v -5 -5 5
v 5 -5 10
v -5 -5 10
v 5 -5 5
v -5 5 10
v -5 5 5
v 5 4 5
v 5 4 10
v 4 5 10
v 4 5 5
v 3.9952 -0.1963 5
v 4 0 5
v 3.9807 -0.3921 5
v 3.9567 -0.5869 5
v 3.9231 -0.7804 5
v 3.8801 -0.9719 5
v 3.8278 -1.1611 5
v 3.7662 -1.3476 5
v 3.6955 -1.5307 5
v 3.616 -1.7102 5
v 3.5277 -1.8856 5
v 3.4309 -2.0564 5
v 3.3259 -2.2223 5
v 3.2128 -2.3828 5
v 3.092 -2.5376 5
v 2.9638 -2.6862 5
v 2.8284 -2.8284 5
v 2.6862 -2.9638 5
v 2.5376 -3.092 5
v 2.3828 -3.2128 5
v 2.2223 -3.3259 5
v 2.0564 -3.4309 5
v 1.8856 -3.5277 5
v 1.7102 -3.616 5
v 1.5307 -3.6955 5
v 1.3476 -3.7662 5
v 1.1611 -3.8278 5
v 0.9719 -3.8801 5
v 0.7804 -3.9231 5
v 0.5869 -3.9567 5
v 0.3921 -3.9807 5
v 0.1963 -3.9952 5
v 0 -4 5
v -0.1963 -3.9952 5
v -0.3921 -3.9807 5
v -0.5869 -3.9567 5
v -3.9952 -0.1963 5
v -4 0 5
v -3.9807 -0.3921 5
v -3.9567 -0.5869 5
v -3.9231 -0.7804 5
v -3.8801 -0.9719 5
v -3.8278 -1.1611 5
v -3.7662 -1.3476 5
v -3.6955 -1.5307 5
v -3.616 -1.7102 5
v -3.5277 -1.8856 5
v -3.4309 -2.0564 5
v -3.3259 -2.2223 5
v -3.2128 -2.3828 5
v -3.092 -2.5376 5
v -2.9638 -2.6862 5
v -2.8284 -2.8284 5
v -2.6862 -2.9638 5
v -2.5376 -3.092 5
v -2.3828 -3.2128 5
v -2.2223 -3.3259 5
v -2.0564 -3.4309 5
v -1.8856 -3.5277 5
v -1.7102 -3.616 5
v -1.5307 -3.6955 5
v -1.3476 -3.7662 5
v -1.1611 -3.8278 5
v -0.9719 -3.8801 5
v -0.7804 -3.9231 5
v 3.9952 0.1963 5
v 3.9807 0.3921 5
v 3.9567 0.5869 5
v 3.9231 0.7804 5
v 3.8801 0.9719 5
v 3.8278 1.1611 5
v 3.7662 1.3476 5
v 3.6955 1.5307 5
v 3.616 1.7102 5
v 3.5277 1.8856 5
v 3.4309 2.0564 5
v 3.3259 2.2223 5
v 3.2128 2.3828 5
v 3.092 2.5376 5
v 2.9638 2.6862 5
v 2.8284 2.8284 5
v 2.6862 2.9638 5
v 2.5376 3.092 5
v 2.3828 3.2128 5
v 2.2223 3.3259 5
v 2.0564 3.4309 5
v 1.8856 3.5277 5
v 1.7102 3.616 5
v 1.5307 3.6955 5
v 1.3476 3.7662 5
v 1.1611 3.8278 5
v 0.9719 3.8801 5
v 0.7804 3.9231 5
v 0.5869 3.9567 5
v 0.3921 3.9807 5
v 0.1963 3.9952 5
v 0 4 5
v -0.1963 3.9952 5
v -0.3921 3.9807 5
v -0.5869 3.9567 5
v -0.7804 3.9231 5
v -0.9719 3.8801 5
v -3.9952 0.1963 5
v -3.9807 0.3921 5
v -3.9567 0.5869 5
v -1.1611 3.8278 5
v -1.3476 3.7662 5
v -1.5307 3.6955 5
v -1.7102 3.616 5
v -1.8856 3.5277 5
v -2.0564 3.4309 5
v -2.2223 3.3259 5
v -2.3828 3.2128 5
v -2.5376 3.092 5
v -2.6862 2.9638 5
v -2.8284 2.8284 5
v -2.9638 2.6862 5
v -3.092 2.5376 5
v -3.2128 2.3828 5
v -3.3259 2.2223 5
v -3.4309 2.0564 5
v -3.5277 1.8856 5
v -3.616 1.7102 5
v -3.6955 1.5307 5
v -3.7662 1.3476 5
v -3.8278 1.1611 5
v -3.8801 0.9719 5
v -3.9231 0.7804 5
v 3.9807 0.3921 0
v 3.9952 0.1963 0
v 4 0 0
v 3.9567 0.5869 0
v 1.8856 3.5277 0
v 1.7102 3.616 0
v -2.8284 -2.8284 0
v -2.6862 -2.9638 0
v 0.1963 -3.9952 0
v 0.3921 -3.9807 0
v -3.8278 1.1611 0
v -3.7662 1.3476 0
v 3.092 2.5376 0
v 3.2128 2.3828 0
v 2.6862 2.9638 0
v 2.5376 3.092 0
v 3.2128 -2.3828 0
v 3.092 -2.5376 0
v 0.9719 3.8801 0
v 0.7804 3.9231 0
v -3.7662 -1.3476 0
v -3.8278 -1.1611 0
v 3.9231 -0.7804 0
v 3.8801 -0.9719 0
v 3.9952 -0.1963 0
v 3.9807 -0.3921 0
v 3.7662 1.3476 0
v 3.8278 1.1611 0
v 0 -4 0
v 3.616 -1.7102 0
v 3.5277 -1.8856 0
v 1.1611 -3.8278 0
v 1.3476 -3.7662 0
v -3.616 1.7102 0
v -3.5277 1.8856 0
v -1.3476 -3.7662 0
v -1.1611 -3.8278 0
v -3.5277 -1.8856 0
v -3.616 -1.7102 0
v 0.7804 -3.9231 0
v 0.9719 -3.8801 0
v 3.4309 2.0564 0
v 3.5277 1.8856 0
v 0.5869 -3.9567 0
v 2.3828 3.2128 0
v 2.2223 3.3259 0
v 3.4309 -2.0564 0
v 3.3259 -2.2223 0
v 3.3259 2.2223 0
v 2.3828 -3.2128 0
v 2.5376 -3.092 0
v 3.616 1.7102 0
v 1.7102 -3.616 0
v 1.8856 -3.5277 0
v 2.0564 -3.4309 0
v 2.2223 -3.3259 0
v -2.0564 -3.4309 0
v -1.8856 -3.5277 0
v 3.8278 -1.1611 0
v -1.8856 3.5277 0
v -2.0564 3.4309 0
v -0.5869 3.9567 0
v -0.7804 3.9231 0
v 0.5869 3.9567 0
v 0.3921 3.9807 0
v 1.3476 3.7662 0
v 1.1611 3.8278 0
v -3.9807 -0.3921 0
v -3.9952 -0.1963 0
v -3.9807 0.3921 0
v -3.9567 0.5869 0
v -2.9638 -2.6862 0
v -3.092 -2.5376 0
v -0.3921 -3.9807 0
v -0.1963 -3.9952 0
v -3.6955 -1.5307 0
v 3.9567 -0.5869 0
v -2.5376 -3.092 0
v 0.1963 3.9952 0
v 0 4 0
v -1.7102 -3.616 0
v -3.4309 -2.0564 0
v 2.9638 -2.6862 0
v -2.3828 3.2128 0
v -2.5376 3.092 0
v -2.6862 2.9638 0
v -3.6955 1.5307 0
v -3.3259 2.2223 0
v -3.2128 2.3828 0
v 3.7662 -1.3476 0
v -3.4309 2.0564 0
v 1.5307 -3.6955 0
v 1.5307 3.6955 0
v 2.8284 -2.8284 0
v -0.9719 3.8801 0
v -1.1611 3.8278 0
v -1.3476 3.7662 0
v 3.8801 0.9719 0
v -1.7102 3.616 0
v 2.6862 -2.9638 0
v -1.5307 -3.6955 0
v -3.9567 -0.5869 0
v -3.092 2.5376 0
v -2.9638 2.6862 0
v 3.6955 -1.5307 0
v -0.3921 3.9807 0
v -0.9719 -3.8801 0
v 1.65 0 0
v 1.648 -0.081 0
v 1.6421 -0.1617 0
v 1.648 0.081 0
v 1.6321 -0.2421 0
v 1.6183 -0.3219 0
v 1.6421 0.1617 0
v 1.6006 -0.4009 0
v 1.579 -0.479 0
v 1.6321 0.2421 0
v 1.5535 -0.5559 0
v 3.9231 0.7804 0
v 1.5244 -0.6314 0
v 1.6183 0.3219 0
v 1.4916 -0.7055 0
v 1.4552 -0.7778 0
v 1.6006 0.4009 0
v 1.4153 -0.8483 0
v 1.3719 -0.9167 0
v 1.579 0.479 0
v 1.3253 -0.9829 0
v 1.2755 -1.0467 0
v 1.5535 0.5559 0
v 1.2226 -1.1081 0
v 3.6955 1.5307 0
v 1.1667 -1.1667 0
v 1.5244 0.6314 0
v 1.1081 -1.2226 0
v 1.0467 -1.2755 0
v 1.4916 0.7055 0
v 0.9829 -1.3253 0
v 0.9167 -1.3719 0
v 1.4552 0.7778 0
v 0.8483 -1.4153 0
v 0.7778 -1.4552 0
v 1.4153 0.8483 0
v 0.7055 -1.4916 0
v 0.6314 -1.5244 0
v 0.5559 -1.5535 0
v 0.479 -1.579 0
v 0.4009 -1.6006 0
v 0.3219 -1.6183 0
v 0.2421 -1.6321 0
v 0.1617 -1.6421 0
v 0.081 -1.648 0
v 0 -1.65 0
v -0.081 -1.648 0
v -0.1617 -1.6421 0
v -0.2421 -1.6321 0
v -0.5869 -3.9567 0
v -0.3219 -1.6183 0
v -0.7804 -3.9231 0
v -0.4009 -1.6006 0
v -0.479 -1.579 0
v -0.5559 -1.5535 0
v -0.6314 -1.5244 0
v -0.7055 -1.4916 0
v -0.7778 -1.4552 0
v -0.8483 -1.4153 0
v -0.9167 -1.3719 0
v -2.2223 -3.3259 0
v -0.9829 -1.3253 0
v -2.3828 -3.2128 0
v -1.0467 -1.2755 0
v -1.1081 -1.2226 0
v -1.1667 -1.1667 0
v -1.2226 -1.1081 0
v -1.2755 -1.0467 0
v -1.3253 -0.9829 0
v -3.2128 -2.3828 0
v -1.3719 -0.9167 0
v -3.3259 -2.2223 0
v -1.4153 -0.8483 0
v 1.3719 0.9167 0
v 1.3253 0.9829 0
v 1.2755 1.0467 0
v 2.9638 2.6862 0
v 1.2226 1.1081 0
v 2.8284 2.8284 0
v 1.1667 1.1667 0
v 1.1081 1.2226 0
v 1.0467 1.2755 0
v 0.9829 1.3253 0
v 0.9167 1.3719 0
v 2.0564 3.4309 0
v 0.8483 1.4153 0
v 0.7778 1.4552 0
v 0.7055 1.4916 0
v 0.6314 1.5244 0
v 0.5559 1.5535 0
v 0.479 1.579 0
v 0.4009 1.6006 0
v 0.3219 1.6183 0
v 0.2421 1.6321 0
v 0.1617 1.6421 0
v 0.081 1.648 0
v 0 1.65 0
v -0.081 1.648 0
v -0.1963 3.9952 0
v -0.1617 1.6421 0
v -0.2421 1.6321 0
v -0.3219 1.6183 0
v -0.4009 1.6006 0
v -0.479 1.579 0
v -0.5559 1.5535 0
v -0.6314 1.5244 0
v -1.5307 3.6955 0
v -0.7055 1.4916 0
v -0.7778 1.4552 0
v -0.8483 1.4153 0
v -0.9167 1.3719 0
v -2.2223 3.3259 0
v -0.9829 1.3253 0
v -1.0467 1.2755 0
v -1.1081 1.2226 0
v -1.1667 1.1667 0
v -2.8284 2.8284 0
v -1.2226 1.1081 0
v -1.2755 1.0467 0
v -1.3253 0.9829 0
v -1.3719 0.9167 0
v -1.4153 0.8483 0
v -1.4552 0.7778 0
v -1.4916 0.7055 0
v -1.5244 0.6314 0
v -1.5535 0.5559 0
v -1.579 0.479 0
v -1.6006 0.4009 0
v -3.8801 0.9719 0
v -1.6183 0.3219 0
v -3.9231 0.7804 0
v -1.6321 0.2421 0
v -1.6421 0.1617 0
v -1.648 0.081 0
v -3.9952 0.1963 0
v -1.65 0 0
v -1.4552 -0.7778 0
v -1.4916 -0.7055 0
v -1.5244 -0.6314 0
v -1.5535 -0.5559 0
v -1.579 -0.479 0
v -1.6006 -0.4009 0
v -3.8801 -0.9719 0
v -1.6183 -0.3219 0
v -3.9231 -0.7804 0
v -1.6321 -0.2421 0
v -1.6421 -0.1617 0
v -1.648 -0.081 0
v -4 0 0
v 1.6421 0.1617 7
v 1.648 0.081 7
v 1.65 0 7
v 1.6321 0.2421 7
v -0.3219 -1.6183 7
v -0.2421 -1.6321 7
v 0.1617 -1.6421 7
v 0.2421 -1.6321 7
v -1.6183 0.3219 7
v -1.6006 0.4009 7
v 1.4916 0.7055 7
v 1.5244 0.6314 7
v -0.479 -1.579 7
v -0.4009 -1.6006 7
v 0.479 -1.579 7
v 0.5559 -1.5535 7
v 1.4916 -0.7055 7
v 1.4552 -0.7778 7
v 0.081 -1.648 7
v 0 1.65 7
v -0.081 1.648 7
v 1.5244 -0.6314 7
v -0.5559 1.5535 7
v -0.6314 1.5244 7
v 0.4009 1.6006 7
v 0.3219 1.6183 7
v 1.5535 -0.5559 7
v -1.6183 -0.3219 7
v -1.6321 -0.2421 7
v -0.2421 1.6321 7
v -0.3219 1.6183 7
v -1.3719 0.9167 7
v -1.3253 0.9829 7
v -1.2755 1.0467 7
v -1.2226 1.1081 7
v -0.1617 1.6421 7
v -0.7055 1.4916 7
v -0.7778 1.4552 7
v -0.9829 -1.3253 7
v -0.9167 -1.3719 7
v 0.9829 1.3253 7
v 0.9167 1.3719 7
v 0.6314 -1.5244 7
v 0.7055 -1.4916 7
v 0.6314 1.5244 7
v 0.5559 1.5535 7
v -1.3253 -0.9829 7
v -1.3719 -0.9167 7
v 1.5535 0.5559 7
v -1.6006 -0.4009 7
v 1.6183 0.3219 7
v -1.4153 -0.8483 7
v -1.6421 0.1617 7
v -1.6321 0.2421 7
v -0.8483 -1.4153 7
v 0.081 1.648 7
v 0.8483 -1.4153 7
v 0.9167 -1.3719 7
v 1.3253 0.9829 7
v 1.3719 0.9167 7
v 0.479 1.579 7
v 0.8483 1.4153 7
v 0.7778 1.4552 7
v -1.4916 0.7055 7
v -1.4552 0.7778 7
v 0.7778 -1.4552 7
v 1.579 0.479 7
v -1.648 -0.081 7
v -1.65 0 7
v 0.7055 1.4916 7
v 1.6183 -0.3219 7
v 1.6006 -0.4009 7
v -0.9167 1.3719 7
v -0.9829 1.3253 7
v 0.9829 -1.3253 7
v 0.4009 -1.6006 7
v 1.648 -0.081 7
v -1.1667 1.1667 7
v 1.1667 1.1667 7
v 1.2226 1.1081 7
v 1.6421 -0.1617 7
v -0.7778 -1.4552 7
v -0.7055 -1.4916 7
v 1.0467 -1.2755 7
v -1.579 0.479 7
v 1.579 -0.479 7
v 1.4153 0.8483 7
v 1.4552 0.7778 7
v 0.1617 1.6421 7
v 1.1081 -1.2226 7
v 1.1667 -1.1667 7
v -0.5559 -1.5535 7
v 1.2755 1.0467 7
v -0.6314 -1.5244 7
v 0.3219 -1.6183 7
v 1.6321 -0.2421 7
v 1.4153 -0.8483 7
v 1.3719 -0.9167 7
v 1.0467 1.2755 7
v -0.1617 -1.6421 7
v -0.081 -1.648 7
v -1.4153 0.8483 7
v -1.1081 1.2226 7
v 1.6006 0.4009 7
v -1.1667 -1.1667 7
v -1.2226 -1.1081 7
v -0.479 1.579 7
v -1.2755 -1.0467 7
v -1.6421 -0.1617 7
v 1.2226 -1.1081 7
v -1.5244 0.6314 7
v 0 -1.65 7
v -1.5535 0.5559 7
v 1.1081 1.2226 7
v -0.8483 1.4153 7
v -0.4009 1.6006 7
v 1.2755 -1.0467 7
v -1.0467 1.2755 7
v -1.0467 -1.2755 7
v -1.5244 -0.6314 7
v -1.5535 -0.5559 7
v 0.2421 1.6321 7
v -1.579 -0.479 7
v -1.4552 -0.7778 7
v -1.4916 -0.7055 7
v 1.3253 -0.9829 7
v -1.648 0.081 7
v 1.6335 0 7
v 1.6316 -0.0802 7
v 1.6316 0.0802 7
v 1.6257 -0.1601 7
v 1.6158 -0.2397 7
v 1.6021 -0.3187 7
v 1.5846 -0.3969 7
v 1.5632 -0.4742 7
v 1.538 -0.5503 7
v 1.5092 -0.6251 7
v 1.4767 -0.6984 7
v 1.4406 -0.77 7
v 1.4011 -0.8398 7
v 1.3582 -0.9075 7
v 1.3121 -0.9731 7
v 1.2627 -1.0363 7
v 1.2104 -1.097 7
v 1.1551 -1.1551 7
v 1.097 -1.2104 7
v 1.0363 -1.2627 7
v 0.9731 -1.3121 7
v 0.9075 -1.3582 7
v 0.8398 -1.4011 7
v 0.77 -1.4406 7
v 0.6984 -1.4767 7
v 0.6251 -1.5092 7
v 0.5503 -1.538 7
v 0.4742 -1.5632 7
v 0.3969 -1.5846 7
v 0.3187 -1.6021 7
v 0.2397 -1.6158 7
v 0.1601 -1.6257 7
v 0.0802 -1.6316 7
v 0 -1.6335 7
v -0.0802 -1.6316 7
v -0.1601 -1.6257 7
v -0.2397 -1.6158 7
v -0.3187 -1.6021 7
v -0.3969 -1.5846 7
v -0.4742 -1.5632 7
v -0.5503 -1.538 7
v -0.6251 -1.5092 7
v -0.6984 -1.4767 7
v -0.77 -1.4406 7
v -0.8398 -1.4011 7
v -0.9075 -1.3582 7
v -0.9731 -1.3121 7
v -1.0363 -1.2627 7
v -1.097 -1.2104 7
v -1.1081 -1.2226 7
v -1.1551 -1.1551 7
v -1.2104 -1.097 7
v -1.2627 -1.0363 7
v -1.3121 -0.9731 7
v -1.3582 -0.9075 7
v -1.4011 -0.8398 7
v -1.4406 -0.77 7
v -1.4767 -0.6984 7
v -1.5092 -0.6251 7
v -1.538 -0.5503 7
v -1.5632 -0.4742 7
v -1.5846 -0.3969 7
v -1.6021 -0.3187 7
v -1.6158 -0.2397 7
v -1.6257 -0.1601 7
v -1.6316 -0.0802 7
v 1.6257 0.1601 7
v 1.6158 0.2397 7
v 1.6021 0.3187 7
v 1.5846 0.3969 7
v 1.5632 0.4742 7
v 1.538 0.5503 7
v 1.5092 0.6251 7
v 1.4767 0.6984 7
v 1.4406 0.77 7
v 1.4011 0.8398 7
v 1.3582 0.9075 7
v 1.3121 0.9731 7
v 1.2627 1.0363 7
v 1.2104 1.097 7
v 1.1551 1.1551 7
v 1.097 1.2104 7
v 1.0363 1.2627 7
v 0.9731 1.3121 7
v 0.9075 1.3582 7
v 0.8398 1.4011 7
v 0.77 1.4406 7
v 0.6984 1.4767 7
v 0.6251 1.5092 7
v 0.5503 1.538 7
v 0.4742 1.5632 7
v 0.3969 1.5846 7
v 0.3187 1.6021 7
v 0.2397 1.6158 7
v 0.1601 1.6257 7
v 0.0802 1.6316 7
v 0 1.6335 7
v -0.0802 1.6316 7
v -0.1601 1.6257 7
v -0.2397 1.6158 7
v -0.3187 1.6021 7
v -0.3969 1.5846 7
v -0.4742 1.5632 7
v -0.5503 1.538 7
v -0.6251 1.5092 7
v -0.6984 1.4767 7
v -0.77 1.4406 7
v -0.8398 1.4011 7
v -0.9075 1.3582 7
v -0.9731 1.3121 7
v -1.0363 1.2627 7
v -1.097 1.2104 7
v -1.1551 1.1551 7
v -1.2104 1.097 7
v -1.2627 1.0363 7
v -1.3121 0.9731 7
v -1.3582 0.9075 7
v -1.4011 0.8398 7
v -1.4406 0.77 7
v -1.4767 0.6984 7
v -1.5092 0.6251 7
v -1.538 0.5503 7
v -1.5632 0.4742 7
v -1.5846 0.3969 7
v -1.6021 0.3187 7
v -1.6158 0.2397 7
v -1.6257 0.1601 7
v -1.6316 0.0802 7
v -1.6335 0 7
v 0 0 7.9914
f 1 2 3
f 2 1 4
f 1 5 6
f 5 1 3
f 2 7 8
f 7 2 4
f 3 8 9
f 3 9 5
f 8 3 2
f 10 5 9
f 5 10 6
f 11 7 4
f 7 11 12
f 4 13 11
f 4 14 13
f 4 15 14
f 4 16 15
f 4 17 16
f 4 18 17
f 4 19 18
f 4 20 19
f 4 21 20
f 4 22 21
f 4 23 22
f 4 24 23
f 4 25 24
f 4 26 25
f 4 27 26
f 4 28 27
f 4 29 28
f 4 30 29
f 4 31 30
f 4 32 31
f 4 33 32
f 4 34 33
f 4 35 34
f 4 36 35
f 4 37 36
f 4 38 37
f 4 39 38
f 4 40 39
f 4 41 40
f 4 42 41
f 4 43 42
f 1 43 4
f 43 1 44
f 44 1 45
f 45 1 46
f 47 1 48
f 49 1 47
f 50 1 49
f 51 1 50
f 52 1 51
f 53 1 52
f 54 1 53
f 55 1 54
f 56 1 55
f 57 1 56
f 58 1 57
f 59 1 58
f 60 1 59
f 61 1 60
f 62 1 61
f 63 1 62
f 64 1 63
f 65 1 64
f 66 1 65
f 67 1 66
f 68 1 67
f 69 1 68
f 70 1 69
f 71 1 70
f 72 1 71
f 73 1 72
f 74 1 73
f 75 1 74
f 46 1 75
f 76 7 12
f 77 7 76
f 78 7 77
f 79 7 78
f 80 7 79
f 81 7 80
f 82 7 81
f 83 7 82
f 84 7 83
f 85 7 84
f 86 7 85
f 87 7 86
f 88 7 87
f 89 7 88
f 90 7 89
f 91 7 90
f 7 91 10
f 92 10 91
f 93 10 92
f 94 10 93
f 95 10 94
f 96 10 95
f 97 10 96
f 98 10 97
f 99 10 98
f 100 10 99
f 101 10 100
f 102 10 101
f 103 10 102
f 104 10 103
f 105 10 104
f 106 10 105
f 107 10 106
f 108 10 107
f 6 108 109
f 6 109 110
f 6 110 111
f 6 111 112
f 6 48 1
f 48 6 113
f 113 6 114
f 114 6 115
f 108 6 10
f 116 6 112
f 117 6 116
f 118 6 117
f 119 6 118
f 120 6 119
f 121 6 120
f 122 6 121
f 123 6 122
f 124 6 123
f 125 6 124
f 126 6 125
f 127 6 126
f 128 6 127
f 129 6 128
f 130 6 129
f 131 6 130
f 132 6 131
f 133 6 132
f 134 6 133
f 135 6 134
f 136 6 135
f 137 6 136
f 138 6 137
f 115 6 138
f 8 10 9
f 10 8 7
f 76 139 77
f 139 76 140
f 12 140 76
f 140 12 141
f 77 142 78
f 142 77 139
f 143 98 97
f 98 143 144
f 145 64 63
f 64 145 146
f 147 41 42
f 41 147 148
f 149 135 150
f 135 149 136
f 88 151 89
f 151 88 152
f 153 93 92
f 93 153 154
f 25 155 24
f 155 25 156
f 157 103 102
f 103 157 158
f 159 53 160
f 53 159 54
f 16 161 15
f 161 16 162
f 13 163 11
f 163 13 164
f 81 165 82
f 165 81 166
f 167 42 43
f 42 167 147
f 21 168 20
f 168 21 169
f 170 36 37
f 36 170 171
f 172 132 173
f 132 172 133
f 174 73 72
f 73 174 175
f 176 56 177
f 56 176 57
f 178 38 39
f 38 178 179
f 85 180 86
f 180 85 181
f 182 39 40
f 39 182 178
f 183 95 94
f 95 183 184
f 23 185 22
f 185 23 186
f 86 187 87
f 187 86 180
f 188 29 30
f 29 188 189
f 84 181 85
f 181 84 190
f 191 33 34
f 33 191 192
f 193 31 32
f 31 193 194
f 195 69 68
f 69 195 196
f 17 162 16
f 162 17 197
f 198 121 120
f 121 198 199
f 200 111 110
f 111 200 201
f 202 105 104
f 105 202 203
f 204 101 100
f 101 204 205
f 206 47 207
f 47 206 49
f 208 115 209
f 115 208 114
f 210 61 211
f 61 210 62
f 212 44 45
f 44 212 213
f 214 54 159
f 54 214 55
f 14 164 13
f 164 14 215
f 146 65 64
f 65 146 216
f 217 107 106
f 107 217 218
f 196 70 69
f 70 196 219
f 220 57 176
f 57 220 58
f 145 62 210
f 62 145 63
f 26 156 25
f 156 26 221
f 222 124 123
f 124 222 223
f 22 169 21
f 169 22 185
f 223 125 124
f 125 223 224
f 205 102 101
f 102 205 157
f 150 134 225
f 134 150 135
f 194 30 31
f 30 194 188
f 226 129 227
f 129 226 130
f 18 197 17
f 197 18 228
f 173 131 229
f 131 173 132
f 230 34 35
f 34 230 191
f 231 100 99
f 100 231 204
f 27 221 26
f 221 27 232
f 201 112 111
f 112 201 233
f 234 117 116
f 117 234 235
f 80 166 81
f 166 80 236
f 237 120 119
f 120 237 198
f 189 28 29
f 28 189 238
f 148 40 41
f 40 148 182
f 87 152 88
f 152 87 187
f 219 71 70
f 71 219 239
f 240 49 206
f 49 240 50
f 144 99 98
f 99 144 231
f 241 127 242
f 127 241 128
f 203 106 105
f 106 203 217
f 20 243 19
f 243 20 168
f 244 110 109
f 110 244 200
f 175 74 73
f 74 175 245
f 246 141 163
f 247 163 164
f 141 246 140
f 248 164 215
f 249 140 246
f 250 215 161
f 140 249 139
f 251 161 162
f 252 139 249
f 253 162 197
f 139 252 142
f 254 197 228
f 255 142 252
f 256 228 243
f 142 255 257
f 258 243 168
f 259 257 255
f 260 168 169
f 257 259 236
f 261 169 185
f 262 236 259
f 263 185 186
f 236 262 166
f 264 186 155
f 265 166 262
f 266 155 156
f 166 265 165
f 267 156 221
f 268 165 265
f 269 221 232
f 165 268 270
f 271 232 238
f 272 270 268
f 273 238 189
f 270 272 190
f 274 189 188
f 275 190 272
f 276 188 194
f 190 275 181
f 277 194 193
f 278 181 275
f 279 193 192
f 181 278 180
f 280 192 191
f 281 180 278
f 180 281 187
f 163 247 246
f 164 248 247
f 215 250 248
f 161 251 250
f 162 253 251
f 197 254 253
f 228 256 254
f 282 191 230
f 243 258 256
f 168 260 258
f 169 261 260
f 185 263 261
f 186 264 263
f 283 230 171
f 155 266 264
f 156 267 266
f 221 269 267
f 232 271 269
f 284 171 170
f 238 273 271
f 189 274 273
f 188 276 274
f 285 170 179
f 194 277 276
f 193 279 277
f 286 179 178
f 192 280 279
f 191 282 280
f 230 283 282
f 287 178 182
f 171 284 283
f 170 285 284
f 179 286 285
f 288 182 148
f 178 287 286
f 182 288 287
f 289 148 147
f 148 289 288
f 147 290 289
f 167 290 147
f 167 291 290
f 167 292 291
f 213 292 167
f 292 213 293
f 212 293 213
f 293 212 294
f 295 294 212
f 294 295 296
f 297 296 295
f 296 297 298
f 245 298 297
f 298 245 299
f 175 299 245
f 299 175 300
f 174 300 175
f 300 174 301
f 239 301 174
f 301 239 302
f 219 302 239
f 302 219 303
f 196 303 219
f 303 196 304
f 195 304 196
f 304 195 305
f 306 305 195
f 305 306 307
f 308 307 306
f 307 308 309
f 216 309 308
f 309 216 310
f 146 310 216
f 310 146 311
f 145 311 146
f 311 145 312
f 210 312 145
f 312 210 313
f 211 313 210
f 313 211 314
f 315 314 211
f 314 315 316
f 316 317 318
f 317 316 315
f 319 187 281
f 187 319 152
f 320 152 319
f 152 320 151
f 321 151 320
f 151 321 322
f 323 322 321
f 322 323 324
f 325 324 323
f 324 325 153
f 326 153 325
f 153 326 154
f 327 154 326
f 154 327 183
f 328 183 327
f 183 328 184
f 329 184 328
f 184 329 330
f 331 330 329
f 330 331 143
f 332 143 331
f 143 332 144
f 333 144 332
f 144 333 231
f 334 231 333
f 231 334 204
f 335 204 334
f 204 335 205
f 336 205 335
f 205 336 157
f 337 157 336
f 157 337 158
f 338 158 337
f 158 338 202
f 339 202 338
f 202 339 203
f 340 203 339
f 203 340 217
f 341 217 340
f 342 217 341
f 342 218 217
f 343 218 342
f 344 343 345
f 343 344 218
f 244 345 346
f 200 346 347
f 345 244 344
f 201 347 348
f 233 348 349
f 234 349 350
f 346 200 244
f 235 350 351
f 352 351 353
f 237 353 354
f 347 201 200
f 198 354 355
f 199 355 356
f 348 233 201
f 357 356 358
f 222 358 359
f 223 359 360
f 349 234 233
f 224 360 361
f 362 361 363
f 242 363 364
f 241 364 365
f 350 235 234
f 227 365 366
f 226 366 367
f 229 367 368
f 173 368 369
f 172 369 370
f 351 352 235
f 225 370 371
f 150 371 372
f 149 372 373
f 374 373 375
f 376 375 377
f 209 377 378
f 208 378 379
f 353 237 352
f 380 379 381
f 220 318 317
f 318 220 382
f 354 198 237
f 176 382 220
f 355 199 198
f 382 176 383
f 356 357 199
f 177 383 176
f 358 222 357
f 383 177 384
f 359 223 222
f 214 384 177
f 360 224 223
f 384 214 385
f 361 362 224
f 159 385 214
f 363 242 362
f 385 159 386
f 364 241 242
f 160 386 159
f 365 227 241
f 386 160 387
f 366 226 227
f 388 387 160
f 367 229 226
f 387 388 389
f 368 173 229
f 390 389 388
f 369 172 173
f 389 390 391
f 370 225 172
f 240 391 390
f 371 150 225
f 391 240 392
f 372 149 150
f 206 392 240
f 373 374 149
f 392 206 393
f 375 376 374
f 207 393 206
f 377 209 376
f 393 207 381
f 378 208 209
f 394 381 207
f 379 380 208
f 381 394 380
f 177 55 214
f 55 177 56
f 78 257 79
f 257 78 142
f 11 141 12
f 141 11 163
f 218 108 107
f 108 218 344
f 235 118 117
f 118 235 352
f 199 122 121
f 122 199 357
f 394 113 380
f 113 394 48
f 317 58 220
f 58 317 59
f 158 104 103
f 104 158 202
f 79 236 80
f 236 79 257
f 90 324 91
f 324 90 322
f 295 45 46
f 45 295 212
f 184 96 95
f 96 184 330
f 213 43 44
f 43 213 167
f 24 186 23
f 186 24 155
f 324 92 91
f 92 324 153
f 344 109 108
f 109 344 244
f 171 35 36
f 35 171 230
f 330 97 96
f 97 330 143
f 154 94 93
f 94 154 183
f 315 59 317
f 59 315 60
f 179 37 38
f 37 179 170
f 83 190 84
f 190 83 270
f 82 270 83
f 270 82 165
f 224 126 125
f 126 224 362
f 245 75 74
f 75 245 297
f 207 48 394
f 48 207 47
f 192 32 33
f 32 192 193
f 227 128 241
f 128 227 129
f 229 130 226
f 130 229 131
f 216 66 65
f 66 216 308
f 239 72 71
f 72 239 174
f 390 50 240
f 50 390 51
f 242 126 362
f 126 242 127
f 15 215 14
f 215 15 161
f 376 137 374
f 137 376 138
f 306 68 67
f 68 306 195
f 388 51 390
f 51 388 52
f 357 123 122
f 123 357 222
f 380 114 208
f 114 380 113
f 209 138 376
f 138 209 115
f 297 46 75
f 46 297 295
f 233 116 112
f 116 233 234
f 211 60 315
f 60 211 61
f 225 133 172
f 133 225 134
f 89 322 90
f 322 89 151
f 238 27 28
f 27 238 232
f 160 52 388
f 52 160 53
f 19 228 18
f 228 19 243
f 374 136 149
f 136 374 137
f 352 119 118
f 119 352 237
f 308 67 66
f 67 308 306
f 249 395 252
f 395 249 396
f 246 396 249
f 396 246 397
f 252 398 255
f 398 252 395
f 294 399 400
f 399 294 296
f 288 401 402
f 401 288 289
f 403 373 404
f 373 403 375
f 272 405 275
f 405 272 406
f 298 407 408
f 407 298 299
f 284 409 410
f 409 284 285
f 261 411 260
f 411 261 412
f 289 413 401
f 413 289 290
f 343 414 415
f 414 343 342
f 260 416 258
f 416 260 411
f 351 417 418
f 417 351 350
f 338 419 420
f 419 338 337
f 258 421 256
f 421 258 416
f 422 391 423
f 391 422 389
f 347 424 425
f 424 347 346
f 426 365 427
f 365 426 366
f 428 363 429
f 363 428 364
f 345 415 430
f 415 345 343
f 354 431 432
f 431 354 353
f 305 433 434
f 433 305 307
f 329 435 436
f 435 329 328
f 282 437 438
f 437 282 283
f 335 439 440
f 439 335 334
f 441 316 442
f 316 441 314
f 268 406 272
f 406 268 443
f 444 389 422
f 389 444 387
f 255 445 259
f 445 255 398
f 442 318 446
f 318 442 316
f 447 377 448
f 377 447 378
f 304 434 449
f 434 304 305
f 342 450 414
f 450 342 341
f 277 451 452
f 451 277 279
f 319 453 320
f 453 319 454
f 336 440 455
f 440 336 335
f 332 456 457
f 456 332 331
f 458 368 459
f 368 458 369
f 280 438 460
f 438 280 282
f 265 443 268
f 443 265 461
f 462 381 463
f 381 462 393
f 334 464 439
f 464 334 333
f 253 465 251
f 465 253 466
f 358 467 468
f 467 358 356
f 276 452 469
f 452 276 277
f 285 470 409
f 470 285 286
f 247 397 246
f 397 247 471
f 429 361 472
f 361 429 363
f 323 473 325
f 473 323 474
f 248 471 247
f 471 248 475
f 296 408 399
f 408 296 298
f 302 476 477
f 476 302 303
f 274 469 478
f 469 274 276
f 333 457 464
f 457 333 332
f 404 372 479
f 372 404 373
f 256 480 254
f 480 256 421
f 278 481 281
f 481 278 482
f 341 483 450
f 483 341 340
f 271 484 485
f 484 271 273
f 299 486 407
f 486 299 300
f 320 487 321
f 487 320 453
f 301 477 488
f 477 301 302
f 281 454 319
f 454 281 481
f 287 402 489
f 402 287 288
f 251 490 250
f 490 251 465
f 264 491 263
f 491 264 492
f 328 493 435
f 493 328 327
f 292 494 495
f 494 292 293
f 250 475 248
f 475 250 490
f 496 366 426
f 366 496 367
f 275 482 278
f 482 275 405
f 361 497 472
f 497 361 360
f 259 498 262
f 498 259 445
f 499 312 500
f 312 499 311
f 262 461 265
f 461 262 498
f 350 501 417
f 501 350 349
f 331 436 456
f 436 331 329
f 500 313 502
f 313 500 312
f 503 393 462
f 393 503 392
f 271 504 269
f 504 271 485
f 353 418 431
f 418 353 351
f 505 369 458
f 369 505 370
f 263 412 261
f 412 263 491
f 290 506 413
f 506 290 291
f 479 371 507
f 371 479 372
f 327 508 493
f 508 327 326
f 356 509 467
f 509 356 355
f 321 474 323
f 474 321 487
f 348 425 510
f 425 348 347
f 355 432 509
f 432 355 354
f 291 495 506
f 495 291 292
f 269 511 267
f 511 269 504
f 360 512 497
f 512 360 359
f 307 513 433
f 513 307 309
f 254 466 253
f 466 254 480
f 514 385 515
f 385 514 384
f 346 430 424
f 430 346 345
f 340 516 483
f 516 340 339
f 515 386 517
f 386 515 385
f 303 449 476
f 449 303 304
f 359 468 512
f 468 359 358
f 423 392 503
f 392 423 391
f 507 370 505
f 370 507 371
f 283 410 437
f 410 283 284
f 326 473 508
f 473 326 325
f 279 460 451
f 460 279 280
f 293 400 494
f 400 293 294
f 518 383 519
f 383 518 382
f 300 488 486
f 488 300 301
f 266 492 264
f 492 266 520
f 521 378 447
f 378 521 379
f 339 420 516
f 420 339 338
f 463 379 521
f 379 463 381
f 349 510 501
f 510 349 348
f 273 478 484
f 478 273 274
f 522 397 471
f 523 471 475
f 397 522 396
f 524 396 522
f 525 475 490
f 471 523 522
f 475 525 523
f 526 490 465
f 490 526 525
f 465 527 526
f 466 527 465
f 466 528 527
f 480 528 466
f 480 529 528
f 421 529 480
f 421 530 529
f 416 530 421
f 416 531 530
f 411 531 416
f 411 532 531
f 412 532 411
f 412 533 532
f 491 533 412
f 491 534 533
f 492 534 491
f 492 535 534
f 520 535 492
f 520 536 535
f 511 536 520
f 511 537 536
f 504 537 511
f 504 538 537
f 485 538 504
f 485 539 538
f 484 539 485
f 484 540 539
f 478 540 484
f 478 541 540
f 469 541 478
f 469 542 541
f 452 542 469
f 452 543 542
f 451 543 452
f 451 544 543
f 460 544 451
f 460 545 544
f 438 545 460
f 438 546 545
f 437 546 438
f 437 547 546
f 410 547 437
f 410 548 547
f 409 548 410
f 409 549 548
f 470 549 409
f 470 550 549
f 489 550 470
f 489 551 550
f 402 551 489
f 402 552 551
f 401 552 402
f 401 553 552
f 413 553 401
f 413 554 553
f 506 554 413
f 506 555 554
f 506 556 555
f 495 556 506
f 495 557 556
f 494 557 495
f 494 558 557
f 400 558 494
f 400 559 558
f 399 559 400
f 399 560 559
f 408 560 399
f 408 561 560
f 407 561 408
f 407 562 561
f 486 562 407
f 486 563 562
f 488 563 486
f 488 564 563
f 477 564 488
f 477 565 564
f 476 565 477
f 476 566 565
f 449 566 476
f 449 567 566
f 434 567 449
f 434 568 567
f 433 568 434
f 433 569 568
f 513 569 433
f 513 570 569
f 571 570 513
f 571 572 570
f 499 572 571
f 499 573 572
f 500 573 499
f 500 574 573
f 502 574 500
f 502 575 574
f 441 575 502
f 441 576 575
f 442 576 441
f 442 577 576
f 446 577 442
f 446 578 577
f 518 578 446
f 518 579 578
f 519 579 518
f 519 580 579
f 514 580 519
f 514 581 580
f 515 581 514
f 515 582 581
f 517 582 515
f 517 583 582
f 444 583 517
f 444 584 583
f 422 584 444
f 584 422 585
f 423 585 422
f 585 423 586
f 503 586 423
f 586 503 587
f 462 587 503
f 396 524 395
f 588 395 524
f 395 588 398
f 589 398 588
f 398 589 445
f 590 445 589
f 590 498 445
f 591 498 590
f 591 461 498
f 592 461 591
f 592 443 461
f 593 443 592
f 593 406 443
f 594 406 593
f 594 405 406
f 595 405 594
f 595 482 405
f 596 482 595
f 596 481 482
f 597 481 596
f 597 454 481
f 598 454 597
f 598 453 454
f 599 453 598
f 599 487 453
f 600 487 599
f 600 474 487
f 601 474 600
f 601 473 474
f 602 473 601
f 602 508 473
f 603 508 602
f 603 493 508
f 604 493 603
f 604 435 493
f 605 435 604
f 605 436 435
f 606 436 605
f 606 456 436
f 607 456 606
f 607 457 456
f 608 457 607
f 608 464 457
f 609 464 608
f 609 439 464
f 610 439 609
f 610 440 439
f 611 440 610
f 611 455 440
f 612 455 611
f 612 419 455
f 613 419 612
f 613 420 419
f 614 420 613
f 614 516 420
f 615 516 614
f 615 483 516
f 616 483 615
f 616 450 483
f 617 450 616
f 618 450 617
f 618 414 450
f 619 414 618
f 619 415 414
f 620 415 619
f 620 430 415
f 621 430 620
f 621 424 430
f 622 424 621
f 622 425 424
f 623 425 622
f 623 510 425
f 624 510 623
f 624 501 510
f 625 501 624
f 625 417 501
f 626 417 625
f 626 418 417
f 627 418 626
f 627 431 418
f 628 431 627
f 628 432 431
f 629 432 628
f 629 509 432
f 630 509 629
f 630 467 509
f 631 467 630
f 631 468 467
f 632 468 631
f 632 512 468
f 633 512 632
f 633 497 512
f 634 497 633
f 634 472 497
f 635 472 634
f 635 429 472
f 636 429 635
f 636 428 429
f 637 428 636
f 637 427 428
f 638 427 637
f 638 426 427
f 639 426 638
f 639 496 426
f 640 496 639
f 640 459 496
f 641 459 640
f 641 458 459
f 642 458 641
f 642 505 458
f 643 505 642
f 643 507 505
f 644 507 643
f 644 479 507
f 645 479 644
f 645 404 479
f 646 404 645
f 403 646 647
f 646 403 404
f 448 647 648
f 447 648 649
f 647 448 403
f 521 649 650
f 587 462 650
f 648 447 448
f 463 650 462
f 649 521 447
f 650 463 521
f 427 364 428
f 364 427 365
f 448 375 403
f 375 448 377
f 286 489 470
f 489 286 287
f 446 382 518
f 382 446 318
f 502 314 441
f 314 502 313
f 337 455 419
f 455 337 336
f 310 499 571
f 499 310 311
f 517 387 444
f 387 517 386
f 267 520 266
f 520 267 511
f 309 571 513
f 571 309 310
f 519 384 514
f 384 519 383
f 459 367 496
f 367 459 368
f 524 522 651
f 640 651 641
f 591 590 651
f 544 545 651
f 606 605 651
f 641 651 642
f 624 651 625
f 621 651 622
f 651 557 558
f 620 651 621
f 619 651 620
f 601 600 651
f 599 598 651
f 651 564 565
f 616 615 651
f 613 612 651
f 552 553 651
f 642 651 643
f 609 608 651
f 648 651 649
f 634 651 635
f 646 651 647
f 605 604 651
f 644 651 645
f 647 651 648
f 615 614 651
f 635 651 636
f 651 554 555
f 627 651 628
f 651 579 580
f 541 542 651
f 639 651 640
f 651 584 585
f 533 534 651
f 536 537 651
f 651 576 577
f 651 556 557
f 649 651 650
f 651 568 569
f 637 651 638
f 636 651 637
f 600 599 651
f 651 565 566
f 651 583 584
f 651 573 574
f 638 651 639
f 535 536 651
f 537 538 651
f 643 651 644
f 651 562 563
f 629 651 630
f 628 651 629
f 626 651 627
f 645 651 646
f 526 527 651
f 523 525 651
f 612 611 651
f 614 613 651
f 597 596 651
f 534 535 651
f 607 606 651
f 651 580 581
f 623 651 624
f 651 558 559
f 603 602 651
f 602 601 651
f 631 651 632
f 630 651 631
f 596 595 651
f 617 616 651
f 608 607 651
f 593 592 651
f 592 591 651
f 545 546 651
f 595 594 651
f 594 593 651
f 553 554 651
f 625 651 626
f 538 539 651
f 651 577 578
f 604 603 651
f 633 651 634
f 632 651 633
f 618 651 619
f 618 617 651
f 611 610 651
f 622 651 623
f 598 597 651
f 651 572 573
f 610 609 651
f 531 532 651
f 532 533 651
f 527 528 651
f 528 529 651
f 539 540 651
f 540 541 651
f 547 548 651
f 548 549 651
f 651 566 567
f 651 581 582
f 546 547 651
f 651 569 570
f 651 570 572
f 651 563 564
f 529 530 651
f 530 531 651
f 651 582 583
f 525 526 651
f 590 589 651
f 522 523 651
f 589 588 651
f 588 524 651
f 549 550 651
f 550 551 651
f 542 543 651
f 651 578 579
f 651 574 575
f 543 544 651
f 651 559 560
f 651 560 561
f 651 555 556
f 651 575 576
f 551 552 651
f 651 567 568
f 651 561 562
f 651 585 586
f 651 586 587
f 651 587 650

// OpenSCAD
// Copyright (C) 2026 Jonas Immanuel Frey - Licensed under GPL. See LICENSE file for details
// Logo branding stamp V1: a brass stamp that screws onto a temperature
// controlled soldering iron, like a tip for heat-set inserts, and presses the
// logo into FDM prints (PLA, PETG). Made for CNC milling at JLCCNC.
//
// The logo comes from a DXF and stands logo_relief proud of the stamp face,
// mirrored, so its impression reads the right way round. A square head carries
// it; a round neck on the back holds the mount: a blind hole for a thread
// (the stamp screws onto a male stud) or a bore with a set screw (the stamp
// slips over a plain round tip).
//
// The thread is not modelled: the hole has the tap drill's diameter, and the
// thread goes into the order as a note, as JLCCNC asks for.
//
// logo_stampV1_TraceTrove.scad is this file with the TraceTrove logo.
// build.py writes the DXFs, the STEP file and the checks.
//
// Origin: on the axis, at the neck's end face. The logo points to +z.
// Units: mm. No external libraries needed.

/* [Logo] */
// Lines and arcs only, closed contours, no doubled entities (build.py dxf).
logo_dxf = "veryos_logo.dxf";
// Size and centre of the logo in the DXF, from build.py analyze.
logo_dxf_size = [43.9095, 31.2528];
logo_dxf_center = [0, 0];
// The height follows from the DXF's proportions.
logo_width = 8;
// How far the logo stands above the stamp face.
logo_relief = 0.4;
// Least distance from the logo to the head's edges.
logo_edge_clearance = 1;
// Inner corners of the logo get this radius, the radius of the end mill that
// cuts them; gaps narrower than twice the radius stay closed. 0 = as drawn.
logo_inner_radius = 0.25;
// true for the stamp; false shows the logo as the impression will read.
logo_mirror = true;

/* [Head] */
head_width = 10;
head_depth = 10;
head_thickness = 5;
// One corner of the head is cut off, to tell where the logo's top is without
// looking at the face: it is the impression's top left corner. 0 = none.
orientation_chamfer = 1;

/* [Mount] */
// thread: blind hole for a thread, the stamp screws onto a male stud.
// bore: plain bore, the stamp slips over a round tip.
mount = "thread"; // [thread, bore]
// Round neck on the back of the head. 0 = the hole is in the head only.
neck_length = 5;
// Wall around the hole; the neck is as thick as the hole plus two walls.
neck_wall = 2;

/* [Mount: thread] */
// M4 x 0.7, as chosen for the iron's stud. M5 is 5 and 0.8.
thread_diameter = 4;
thread_pitch = 0.7;
// Depth of the full thread. Not less than the stud is long.
thread_depth = 5;

/* [Mount: bore] */
// Diameter of the tip the stamp slips over. Placeholder: measure the tip.
bore_diameter = 6;
// Added to the bore's diameter.
bore_clearance = 0.05;
bore_depth = 8;
// Thread of the set screw in the neck's side, M3 x 0.5. 0 = no set screw.
set_screw_diameter = 3;
set_screw_pitch = 0.5;

/* [Quality] */
$fn = 128;

/* [Hidden] */
eps = 0.01;
logo_scale = logo_width / logo_dxf_size[0];
logo_height = logo_dxf_size[1] * logo_scale;
// The hole as it is machined: a tap drill is the thread's diameter less its
// pitch (3.3 for M4, 4.2 for M5).
hole_nominal = mount == "thread" ? thread_diameter : bore_diameter;
hole_diameter = mount == "thread" ? thread_diameter - thread_pitch : bore_diameter + bore_clearance;
// A blind thread ends half a diameter above the hole's bottom (JLCCNC's
// threaded hole guideline). The drill's 118 degree point comes below that.
thread_runout = thread_diameter / 2;
hole_depth = mount == "thread" ? thread_depth + thread_runout : bore_depth;
hole_point = mount == "thread" ? hole_diameter / 2 / tan(59) : 0;
neck_diameter = hole_nominal + 2 * neck_wall;
face_z = neck_length + head_thickness;
// Solid brass between the hole and the stamp face.
floor_thickness = face_z - hole_depth - hole_point;

assert(logo_width + 2 * logo_edge_clearance <= head_width + eps
       && logo_height + 2 * logo_edge_clearance <= head_depth + eps,
       "The logo is closer to the head's edge than logo_edge_clearance; lower logo_width or enlarge the head.");
assert(neck_length == 0 || neck_diameter <= min(head_width, head_depth),
       "The neck is thicker than the head; lower neck_wall.");
assert(floor_thickness >= 1,
       "Less than 1 mm of brass between the hole and the stamp face; lengthen the neck or shorten the hole.");
assert(mount != "thread" || thread_depth <= 3 * thread_diameter,
       "JLCCNC taps a thread at most three diameters deep.");
assert(mount != "bore" || set_screw_diameter == 0 || neck_length >= set_screw_diameter + 2,
       "The neck is too short for the set screw.");

// The logo as it lies on the stamp face: centred, logo_width wide, mirrored.
module logo_2d() {
    offset(r = -logo_inner_radius) offset(r = logo_inner_radius)
        scale([logo_mirror ? -logo_scale : logo_scale, logo_scale])
            translate(-logo_dxf_center) import(logo_dxf);
}

module logo() {
    translate([0, 0, face_z - eps]) linear_extrude(logo_relief + eps) logo_2d();
}

// Head and neck. The cut corner is at the impression's top left, which is
// the top right when looking at the mirrored logo.
module stamp_body() {
    side = logo_mirror ? 1 : -1;
    translate([0, 0, neck_length]) linear_extrude(head_thickness) difference() {
        square([head_width, head_depth], center = true);
        translate([side * head_width / 2, head_depth / 2]) rotate(45)
            square(orientation_chamfer * sqrt(2), center = true);
    }
    if (neck_length > 0) cylinder(d = neck_diameter, h = neck_length + eps);
}

// What the mount removes: the hole from the neck's end, and for the bore the
// set screw's tap hole through the neck's wall, halfway along the neck.
module mount_cut() {
    translate([0, 0, -eps]) cylinder(d = hole_diameter, h = hole_depth + eps);
    if (hole_point > 0)
        translate([0, 0, hole_depth - eps]) cylinder(d1 = hole_diameter, d2 = 0, h = hole_point + eps);
    if (mount == "bore" && set_screw_diameter > 0)
        translate([0, 0, neck_length / 2]) rotate([-90, 0, 0])
            cylinder(d = set_screw_diameter - set_screw_pitch, h = max(head_width, head_depth));
}

// The colours only tell the logo from the stamp face in the preview.
module stamp() {
    difference() {
        union() {
            color("goldenrod") stamp_body();
            color("saddlebrown") logo();
        }
        color("goldenrod") mount_cut();
    }
}

stamp();
